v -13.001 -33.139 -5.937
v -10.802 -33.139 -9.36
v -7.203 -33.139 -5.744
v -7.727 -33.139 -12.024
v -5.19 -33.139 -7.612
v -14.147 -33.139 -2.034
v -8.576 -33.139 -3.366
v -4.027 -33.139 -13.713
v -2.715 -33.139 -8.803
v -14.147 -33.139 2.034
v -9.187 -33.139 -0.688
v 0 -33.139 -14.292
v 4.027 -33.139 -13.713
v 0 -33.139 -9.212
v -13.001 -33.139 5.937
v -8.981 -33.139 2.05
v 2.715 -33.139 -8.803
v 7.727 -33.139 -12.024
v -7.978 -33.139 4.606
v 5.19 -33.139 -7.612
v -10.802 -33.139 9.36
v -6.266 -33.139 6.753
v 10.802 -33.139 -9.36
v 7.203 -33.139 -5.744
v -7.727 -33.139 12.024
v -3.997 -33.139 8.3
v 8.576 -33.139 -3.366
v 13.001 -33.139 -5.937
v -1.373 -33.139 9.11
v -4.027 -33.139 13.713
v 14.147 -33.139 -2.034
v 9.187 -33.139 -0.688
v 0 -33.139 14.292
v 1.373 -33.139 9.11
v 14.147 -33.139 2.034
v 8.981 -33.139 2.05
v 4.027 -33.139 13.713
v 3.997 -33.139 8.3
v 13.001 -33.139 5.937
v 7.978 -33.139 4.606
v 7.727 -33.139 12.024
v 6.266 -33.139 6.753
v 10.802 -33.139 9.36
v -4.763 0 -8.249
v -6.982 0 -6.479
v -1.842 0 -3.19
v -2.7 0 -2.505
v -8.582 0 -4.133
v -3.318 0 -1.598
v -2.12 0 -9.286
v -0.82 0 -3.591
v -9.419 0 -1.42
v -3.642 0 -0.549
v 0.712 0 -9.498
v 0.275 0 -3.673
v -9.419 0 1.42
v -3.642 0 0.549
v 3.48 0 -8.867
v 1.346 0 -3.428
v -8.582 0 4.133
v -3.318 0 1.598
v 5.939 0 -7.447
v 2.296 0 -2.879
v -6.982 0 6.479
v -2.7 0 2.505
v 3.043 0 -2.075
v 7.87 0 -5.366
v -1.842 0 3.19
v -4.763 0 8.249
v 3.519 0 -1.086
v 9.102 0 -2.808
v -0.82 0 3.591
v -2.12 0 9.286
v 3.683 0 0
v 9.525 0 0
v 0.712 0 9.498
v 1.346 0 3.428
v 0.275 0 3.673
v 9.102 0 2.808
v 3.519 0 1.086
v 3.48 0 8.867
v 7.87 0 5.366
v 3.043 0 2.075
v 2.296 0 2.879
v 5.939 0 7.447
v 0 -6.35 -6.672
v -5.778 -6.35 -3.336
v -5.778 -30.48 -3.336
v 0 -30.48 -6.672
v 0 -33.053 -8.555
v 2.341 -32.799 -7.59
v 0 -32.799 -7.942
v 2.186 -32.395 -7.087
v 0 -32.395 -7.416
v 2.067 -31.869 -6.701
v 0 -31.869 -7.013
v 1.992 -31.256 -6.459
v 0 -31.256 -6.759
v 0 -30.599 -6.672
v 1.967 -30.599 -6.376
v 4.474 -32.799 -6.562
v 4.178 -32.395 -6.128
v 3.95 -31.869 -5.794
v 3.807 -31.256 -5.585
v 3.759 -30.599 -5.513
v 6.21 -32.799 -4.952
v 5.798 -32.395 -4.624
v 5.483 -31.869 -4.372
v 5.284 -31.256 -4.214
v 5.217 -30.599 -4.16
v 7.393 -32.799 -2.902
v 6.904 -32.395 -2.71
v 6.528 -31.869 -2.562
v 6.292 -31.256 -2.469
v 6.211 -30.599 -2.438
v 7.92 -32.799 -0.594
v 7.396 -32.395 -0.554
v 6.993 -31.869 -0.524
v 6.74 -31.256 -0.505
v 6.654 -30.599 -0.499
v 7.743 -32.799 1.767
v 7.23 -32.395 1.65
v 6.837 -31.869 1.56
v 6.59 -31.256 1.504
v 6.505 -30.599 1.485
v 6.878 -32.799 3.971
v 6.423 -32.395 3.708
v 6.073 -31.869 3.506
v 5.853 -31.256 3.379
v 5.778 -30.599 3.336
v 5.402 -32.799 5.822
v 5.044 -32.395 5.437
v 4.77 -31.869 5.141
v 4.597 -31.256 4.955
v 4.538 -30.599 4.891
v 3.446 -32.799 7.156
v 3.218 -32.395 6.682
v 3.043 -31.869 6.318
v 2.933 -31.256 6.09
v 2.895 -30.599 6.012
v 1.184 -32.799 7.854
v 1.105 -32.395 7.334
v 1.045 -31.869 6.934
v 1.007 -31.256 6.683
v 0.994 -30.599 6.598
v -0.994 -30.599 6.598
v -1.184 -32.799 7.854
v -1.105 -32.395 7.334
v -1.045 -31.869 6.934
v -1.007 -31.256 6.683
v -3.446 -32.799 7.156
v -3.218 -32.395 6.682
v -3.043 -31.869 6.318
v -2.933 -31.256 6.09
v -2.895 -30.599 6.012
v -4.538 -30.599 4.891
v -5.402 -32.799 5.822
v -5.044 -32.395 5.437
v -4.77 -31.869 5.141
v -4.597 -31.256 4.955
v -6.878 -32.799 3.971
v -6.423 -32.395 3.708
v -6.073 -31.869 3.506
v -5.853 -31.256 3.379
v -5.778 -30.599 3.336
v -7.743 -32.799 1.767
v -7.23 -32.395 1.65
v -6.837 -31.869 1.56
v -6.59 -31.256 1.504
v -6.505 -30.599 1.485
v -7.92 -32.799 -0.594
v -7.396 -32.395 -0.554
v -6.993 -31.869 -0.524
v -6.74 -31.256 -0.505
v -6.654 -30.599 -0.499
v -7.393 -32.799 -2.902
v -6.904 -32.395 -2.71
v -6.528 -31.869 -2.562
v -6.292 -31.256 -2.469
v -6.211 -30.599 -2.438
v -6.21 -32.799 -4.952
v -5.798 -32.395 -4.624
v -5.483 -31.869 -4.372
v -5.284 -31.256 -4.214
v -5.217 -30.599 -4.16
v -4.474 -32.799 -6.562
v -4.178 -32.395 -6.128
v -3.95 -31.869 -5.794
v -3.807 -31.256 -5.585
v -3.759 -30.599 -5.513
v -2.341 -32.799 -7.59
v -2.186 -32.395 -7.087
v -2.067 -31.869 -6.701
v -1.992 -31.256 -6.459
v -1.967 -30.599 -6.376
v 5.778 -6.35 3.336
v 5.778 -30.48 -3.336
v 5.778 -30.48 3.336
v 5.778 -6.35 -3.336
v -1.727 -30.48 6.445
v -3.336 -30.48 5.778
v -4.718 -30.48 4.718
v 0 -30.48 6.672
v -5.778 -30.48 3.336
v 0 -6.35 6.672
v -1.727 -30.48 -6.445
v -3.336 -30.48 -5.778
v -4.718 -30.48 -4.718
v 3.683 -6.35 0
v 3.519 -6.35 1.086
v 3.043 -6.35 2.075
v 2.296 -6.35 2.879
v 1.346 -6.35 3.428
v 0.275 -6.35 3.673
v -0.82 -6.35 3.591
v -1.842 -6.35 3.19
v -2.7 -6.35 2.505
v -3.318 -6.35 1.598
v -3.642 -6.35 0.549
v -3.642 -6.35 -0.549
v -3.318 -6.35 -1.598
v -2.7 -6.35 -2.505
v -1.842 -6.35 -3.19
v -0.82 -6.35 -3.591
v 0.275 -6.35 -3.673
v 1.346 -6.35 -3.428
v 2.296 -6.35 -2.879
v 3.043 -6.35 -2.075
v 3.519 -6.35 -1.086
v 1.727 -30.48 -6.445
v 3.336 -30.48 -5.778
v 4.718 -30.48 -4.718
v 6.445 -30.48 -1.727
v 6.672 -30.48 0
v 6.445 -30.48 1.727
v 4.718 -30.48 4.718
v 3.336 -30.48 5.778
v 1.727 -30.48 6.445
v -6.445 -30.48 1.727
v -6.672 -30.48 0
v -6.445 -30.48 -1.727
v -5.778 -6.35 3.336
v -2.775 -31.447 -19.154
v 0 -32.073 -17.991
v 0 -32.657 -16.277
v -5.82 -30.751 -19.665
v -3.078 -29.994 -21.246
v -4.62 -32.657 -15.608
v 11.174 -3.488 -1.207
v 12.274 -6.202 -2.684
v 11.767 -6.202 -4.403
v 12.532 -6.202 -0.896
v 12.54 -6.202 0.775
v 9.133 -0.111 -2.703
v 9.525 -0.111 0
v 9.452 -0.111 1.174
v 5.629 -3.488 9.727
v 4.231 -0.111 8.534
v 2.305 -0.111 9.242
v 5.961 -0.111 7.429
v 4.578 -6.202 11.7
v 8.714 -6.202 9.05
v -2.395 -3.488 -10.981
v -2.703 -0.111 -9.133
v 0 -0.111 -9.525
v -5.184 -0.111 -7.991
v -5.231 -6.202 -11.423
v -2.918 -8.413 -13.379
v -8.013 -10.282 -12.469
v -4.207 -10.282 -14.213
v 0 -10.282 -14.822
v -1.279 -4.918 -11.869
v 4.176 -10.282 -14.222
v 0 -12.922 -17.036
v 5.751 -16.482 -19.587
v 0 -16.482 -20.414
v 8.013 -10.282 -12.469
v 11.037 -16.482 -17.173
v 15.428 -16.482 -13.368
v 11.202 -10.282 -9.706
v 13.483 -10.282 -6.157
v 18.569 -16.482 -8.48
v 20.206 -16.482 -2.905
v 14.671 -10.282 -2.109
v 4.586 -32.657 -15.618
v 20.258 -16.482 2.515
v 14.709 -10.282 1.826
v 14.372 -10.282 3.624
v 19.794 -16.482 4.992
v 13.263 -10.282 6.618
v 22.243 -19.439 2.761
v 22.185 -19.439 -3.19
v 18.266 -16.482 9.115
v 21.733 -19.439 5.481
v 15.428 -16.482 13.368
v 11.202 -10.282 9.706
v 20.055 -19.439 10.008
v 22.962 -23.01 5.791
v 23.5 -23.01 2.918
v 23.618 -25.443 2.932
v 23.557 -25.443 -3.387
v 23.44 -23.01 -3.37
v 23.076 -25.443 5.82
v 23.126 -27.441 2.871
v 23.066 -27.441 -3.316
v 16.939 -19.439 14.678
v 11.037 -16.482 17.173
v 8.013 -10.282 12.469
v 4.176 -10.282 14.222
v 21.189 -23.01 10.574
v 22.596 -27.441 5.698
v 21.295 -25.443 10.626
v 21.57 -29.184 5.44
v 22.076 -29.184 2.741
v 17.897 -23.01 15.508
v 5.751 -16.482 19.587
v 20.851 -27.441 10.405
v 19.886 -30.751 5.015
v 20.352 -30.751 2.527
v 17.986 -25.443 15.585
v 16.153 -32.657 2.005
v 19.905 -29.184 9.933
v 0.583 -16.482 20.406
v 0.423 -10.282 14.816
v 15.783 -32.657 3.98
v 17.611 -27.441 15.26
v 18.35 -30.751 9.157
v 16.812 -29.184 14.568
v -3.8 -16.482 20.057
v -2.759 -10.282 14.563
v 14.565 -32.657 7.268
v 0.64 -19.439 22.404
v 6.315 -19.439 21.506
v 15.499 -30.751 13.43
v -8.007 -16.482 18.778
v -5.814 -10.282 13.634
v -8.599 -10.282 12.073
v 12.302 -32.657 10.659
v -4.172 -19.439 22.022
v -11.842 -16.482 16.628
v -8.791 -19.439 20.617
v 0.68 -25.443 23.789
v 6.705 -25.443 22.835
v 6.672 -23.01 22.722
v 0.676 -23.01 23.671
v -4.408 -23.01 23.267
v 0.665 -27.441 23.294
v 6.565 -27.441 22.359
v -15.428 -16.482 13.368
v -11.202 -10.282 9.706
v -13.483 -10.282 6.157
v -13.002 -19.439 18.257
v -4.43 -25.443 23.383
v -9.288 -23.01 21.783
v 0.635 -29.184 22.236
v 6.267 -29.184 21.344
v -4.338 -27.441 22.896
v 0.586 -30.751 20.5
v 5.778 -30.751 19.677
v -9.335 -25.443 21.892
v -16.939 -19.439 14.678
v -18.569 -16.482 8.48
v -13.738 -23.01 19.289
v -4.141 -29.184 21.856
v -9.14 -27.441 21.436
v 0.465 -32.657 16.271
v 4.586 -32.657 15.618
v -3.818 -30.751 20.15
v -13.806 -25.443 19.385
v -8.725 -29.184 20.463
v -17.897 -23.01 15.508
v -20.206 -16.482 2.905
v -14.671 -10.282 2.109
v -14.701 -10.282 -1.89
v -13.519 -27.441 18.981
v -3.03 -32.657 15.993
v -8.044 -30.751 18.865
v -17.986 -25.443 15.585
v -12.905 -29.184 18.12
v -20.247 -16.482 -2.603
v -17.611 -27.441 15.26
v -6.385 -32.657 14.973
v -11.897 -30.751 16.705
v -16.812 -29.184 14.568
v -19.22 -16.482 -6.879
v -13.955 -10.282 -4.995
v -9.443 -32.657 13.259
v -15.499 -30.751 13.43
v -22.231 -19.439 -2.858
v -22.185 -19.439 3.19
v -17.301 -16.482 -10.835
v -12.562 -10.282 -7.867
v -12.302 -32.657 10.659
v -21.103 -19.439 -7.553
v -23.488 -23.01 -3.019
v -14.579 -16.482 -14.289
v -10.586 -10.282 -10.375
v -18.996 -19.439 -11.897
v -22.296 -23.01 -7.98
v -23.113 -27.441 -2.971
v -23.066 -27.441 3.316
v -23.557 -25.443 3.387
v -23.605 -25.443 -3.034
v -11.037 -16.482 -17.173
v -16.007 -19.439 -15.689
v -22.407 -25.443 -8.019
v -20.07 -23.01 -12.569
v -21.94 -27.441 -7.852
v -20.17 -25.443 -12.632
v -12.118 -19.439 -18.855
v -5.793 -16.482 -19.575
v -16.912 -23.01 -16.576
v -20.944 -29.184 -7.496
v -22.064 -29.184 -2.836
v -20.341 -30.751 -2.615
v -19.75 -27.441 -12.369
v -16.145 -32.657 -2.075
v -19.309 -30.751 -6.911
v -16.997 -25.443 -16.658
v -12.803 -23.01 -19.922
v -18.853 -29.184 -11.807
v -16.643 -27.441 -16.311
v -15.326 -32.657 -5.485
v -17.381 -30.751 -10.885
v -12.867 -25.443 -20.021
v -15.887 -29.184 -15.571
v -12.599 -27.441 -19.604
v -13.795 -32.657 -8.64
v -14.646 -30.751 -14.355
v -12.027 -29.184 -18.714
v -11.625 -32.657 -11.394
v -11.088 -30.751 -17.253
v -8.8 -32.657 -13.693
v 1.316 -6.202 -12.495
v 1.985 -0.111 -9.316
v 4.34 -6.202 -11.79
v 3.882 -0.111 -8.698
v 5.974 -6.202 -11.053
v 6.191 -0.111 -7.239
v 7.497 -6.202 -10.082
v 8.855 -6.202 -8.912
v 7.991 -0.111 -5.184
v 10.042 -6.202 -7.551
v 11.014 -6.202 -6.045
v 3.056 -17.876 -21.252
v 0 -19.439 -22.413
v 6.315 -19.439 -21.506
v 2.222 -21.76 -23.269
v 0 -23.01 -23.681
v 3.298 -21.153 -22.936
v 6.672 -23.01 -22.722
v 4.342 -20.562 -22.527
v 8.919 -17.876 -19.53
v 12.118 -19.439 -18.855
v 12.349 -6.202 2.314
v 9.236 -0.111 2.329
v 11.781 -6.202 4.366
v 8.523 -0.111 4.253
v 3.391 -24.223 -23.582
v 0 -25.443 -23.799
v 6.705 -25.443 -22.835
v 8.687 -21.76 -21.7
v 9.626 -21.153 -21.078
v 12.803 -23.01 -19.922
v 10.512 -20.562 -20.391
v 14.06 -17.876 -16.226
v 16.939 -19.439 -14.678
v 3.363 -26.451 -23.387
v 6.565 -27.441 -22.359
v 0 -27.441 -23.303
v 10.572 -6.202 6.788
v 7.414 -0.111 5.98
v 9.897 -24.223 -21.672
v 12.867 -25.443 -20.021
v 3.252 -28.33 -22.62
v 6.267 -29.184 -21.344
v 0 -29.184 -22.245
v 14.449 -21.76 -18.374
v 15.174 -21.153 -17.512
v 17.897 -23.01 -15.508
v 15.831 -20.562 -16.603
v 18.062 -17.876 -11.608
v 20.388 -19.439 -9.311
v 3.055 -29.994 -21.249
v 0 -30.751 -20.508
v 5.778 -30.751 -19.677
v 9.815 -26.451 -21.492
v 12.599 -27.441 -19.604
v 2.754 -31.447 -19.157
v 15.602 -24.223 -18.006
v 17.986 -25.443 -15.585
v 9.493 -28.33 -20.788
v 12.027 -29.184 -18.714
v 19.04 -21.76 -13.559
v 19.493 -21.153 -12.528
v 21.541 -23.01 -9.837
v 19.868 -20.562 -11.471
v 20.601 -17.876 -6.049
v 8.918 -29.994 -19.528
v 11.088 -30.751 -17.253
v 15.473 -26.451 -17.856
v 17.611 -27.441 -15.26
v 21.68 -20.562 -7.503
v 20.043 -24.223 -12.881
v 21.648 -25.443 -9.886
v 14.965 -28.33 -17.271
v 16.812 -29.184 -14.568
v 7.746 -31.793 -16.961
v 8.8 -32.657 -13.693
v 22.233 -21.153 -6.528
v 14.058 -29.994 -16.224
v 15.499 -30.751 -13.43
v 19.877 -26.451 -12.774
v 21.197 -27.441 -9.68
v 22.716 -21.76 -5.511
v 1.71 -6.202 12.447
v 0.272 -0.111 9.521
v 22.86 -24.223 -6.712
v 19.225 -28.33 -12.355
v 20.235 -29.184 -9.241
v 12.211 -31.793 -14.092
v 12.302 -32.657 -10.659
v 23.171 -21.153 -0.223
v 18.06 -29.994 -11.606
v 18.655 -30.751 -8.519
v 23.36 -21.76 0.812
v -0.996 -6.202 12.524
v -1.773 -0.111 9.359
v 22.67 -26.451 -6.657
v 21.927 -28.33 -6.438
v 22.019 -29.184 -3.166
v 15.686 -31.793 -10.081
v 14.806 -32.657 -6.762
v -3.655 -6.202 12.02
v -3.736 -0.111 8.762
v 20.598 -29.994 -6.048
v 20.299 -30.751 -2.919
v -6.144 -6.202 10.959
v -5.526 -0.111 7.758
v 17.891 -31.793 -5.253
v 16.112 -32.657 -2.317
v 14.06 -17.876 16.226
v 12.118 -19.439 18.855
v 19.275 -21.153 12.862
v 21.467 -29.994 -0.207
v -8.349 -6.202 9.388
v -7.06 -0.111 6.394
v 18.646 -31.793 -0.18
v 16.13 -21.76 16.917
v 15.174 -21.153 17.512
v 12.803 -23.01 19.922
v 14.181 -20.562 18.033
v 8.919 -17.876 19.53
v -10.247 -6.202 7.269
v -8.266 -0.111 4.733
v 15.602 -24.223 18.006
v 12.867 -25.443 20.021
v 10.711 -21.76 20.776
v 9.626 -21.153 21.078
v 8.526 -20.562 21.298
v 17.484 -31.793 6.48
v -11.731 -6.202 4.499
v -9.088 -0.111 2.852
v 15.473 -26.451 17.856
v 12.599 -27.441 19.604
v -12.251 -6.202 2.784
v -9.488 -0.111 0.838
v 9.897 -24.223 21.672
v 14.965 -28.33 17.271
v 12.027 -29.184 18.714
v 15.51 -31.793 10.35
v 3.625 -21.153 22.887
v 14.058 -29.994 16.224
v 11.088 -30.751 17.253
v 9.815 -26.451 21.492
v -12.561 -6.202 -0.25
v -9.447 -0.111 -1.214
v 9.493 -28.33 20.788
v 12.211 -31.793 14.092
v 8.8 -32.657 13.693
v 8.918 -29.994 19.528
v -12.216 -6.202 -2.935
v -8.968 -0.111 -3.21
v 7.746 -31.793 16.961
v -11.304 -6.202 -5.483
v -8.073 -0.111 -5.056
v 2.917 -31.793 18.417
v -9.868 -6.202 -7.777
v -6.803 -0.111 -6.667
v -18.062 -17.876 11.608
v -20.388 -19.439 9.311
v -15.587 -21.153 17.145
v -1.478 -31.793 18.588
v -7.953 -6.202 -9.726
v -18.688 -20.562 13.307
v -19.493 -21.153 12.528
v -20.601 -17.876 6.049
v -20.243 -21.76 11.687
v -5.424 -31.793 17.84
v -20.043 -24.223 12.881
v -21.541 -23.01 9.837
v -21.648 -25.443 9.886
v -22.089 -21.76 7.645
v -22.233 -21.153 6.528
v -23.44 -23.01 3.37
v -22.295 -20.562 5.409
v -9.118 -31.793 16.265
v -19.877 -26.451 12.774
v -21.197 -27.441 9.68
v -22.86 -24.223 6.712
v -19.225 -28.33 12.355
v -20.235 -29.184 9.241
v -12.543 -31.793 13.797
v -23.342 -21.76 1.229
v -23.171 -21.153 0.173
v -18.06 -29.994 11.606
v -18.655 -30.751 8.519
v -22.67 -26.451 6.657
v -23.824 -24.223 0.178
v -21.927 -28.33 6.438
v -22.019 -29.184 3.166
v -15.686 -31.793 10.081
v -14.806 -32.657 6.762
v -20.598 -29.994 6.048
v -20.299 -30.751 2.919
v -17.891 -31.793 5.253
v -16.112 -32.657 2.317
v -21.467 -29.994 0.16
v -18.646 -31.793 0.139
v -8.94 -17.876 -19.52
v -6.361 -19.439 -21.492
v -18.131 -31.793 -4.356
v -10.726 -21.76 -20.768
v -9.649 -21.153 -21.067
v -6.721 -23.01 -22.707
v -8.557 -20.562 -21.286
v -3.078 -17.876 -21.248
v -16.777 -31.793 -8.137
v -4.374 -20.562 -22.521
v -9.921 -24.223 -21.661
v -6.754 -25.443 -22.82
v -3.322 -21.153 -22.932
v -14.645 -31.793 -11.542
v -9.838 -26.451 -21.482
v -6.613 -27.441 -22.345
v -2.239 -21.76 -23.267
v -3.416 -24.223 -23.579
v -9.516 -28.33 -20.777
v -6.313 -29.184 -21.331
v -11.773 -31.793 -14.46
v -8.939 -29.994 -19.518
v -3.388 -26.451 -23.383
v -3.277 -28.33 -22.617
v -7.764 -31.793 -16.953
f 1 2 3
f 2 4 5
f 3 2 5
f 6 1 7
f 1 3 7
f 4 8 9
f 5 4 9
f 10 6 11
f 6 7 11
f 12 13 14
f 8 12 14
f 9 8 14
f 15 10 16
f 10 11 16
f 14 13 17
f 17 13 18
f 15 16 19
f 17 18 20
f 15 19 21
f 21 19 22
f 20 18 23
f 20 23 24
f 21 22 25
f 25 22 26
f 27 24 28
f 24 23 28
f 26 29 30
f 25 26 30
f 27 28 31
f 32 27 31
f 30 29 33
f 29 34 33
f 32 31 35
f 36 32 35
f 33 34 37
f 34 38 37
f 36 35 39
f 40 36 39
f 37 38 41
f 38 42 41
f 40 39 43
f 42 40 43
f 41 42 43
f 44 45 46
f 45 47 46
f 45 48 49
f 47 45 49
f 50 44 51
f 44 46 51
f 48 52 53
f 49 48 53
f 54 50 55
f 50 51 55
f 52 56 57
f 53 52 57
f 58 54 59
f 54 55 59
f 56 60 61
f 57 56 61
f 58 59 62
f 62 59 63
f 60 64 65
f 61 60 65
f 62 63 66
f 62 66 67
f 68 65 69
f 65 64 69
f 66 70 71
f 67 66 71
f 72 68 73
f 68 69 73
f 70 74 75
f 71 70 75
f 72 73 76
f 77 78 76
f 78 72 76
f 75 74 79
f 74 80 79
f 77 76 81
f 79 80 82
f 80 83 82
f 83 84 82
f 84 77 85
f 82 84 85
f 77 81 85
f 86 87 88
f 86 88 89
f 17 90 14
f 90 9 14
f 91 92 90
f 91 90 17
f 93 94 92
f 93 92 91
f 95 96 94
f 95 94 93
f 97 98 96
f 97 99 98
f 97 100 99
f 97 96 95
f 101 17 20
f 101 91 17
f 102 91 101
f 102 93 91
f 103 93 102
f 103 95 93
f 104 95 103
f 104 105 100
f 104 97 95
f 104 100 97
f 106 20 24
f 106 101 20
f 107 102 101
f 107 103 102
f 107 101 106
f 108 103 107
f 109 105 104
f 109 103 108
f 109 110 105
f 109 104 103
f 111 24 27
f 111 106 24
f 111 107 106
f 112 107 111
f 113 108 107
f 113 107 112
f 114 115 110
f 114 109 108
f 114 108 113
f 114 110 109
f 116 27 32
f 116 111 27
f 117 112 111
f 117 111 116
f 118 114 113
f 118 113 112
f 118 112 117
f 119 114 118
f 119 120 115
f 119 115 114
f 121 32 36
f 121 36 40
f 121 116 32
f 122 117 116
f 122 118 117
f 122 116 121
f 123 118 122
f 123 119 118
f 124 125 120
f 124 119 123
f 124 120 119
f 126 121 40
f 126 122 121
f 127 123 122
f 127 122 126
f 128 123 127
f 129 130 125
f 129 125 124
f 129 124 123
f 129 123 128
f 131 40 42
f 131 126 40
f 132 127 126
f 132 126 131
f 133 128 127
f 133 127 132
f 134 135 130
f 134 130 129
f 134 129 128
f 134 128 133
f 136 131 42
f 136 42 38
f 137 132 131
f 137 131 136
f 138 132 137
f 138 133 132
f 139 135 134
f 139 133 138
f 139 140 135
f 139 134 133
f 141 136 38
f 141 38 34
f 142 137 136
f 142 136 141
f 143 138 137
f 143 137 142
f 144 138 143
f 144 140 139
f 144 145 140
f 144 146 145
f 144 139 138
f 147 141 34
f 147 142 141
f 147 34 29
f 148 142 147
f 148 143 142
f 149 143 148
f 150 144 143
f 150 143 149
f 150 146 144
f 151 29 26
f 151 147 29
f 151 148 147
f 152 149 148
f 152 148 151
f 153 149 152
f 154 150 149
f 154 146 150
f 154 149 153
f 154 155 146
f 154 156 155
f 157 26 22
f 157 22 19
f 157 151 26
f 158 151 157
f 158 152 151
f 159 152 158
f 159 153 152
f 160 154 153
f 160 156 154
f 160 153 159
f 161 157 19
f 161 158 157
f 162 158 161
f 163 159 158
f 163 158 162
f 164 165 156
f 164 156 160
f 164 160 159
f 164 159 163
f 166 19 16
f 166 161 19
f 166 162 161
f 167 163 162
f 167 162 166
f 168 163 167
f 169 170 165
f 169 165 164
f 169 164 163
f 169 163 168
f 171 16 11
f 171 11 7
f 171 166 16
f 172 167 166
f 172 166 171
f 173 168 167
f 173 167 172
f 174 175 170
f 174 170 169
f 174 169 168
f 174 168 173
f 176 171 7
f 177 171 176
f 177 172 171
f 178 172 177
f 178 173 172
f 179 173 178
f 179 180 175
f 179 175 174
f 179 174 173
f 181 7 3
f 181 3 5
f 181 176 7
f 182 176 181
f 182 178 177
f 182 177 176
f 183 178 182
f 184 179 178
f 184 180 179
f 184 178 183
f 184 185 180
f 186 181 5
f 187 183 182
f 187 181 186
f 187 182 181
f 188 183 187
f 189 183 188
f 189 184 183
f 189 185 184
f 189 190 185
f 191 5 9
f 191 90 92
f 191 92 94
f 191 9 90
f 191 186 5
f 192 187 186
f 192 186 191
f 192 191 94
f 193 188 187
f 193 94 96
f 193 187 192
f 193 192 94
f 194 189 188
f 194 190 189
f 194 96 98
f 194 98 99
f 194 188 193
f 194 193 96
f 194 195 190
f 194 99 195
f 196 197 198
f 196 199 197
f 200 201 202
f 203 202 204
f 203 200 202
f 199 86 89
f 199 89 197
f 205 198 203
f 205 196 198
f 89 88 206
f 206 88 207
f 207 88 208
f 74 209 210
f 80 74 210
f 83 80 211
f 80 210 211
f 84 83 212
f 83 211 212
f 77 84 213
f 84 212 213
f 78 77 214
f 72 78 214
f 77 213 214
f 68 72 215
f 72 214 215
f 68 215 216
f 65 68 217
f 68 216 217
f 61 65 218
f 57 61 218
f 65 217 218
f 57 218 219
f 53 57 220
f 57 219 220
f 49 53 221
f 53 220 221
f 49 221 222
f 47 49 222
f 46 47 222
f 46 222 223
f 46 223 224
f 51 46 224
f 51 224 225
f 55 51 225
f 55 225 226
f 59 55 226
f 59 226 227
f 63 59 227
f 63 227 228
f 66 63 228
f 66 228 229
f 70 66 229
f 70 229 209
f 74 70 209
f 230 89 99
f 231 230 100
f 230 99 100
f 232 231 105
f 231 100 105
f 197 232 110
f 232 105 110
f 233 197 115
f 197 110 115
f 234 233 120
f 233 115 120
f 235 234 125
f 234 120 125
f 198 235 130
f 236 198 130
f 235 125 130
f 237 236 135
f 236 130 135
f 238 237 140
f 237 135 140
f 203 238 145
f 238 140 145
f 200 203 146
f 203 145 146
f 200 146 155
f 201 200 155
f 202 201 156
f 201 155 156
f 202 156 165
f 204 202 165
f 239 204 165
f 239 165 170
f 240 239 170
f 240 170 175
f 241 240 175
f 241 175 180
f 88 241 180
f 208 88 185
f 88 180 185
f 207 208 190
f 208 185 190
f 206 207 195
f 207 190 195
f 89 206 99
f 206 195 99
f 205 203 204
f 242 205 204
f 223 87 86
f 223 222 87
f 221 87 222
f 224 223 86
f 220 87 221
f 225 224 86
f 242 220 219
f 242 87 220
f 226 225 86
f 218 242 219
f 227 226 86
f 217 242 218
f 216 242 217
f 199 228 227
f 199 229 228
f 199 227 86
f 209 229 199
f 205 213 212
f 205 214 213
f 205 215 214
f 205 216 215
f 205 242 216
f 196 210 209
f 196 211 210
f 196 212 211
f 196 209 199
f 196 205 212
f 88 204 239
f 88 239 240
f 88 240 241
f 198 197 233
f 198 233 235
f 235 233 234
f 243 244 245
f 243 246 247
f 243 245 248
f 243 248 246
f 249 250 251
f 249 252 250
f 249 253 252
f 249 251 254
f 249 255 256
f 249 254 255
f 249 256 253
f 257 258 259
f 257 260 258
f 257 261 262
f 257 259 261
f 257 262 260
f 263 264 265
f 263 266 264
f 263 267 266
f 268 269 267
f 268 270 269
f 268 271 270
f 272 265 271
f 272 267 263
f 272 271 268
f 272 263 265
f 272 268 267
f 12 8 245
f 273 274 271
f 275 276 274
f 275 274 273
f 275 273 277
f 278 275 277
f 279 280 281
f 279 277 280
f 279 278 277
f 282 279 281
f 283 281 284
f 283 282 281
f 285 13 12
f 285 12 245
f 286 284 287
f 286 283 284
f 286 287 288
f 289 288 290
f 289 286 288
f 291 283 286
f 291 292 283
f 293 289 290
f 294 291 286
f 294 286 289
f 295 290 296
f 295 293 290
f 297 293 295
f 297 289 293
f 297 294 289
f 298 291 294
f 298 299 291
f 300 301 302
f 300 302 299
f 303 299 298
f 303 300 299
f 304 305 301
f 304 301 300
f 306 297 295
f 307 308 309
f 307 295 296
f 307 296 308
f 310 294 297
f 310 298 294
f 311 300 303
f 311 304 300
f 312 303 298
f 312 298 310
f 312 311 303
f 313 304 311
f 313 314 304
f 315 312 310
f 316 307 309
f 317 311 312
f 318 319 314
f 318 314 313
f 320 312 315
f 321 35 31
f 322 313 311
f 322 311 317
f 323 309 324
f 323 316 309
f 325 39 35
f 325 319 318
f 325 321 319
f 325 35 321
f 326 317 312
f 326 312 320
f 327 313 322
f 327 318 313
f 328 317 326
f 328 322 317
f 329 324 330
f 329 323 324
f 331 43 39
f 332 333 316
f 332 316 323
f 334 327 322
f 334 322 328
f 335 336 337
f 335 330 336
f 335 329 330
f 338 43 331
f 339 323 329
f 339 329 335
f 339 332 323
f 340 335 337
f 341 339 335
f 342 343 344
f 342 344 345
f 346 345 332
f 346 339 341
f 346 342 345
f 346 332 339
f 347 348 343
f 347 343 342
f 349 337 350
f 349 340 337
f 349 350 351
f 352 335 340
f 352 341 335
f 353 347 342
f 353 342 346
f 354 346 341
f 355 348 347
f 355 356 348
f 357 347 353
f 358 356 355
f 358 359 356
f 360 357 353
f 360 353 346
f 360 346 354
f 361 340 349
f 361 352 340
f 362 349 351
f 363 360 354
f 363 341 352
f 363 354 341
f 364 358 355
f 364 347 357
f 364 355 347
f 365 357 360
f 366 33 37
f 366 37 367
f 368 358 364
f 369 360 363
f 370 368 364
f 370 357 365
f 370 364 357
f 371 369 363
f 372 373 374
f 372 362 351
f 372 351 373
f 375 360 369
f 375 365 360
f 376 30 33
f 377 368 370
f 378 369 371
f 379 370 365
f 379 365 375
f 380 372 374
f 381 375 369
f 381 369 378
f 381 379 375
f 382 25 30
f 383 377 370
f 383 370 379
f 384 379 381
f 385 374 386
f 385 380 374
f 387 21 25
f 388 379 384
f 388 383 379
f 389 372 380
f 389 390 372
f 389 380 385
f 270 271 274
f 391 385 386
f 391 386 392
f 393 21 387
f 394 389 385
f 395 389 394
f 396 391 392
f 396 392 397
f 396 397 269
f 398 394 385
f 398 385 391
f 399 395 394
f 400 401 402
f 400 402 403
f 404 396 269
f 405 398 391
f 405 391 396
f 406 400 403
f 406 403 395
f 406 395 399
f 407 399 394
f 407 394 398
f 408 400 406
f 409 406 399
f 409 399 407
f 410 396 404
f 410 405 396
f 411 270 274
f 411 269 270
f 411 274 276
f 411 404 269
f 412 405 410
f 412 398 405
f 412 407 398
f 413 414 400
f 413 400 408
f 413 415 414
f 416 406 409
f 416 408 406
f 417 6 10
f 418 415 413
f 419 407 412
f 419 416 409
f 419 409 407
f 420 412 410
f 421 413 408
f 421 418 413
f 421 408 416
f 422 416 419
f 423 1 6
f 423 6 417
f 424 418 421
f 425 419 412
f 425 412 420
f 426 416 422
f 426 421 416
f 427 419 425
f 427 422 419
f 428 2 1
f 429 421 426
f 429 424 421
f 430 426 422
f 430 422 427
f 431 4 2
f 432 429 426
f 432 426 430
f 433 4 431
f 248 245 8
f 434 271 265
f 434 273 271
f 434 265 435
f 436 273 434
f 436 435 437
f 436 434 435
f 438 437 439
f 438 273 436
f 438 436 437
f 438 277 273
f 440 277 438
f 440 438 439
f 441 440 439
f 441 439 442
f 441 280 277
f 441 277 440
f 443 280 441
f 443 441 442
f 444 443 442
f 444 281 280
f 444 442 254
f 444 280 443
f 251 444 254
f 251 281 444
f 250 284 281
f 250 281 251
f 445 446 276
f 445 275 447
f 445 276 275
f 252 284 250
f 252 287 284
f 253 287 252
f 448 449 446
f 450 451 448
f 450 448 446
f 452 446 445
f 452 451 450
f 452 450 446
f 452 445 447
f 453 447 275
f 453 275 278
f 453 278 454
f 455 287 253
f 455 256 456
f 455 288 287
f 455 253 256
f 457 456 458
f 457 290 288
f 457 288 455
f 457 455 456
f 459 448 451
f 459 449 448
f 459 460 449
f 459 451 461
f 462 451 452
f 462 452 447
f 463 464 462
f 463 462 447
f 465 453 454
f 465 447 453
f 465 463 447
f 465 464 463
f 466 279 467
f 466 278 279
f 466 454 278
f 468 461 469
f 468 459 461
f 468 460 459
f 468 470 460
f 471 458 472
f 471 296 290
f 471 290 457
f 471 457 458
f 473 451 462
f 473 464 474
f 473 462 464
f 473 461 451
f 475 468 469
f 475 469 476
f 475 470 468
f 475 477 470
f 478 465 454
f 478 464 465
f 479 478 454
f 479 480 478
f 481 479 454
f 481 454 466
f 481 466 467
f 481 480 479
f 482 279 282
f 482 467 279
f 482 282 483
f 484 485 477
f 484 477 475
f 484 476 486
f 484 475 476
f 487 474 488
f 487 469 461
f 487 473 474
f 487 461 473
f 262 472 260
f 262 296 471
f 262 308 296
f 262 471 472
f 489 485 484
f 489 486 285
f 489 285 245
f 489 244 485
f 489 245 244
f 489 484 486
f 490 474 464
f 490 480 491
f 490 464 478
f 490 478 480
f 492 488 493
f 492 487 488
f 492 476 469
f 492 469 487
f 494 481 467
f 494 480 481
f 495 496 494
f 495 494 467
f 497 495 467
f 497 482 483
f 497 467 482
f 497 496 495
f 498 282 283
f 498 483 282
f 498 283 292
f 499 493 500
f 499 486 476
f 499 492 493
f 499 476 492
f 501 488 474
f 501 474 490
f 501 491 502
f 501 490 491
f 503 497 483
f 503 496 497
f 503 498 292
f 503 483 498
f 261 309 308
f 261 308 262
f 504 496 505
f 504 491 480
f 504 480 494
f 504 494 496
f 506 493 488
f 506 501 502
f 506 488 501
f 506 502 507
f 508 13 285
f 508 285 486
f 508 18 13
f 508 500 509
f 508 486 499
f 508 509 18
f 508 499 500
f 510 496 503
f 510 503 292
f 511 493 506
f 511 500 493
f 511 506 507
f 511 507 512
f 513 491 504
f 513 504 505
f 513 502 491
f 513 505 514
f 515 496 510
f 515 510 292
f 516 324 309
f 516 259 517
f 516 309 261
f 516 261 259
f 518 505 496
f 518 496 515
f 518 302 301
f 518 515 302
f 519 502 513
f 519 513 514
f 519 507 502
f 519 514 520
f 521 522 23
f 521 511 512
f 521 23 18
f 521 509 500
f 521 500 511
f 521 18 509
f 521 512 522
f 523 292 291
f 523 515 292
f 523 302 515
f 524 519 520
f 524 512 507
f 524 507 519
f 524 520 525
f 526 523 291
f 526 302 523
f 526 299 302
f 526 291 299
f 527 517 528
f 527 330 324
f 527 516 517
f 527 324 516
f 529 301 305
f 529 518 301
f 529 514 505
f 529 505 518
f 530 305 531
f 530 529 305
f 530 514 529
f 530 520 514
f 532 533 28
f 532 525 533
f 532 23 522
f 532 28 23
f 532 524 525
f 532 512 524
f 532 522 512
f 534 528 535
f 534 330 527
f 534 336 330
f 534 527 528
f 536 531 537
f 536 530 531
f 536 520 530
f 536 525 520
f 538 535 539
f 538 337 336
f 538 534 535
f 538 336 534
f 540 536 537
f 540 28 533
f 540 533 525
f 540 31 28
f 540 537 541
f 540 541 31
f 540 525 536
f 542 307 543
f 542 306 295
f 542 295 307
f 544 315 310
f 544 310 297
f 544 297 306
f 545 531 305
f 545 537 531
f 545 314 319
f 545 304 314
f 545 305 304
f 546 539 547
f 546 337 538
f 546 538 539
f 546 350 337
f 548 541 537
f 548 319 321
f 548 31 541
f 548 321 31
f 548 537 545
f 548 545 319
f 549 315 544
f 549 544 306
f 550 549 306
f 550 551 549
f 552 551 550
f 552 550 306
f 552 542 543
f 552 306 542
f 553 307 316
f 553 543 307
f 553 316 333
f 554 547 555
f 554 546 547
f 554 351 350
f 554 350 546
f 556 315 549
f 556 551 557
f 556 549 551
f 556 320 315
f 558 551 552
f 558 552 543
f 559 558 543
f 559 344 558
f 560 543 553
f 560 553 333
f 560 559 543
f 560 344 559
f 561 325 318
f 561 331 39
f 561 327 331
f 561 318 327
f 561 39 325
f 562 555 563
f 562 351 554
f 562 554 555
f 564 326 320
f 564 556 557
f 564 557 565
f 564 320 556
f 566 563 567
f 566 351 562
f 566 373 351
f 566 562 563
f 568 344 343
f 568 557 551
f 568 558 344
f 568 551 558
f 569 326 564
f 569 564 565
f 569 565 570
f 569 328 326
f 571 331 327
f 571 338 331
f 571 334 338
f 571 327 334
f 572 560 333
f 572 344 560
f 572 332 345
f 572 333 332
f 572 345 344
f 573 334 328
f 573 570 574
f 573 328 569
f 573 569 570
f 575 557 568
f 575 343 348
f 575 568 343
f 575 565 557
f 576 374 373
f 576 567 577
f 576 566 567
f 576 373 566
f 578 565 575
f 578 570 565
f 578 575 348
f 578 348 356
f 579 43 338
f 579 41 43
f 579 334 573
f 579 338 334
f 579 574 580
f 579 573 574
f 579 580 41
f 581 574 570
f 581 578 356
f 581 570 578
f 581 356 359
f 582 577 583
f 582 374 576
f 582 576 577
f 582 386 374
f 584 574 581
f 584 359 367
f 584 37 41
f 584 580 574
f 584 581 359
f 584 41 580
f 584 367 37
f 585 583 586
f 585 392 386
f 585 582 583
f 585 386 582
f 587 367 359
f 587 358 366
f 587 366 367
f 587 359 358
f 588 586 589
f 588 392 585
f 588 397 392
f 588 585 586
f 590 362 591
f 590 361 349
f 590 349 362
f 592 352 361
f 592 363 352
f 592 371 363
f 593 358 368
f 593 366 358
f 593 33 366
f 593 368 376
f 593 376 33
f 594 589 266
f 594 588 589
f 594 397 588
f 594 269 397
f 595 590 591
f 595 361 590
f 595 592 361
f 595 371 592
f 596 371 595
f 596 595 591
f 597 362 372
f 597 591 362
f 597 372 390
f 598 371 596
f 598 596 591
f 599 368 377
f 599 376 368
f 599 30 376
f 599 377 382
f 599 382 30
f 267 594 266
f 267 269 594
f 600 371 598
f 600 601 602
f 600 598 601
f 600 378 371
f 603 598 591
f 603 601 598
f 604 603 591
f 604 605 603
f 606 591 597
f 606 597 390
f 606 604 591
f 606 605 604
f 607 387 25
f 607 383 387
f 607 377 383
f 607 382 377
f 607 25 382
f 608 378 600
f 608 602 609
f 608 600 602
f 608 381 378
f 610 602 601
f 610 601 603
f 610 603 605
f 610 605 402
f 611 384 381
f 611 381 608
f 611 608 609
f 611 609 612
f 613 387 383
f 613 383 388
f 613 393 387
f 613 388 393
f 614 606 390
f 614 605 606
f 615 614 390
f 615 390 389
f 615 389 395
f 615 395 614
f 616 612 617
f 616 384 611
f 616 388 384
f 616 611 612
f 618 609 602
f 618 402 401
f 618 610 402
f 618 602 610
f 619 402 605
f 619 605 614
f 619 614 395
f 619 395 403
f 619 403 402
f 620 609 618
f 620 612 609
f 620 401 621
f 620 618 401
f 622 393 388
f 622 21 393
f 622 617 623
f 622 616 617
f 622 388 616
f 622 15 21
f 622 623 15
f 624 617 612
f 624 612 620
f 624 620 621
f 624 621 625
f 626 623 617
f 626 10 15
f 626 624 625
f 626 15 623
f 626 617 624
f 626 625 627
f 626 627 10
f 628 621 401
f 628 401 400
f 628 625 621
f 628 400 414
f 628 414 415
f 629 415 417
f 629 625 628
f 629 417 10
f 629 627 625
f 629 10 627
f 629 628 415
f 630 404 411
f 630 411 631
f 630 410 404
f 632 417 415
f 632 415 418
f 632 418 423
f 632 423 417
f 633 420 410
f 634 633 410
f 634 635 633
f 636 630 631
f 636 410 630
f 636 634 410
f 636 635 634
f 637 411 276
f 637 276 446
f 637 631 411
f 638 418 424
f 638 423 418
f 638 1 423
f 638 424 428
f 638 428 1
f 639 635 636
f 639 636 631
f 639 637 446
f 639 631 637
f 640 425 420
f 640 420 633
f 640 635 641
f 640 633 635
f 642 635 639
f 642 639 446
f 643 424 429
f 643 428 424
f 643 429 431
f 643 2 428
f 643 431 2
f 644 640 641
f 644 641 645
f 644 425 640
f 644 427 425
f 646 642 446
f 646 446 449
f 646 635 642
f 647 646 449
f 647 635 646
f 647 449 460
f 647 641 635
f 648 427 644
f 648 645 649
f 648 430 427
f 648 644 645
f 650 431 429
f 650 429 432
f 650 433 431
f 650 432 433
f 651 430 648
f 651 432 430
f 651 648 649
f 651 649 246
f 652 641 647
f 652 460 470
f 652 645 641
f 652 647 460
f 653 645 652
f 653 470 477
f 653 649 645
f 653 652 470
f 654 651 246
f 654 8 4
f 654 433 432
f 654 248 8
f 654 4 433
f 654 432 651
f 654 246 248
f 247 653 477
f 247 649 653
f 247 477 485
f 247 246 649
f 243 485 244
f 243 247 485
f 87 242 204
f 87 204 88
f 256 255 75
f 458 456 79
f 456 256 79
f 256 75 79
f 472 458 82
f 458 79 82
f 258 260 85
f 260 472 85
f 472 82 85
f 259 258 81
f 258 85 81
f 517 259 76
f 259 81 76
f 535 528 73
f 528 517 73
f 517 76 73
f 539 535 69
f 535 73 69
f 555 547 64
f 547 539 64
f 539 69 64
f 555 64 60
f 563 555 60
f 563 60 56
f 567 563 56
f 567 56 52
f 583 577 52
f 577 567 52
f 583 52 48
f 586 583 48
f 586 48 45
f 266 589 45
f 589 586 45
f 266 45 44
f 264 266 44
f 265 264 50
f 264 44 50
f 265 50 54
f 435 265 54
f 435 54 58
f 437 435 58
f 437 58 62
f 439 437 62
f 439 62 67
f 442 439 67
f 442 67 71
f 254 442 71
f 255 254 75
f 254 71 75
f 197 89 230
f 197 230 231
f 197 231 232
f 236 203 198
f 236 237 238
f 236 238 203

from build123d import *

# Parameters (mm, degrees)
F0_R     = 9.525
F1_DEPTH = 15.24
F3_DEPTH = 8.89
F4_R     = 3.683
F5_DEPTH = 6.351
F8_R     = 2.54
F9_DEPTH = 15.24


# Not quite as in the source:
# - a feature names something its author has since deleted; it is built from what else it names


with BuildPart() as f1:
    # F0 (on Front) → F1 (new body)
    with BuildSketch(Plane.XZ):
        Circle(F0_R)
    extrude(amount=F1_DEPTH)

    # F2 (on face) → F3 (cut)
    with BuildSketch(Plane.XZ.offset(15.24)):
        Polygon((5.7785, -3.3362185305), (5.7785, 3.3362185305), (0, 6.672437061), (-5.7785, 3.3362185305), (-5.7785, -3.3362185305), (0, -6.672437061), align=None)
    extrude(amount=-F3_DEPTH, mode=Mode.SUBTRACT)

    # F4 (on face) → F5 (cut, through all)
    with BuildSketch(Plane.XZ.offset(6.35)):
        Circle(F4_R)
    extrude(amount=-F5_DEPTH, mode=Mode.SUBTRACT)

    # F6 (on Right) → F7 (revolve)
    with BuildSketch(Plane.YZ):
        with BuildLine():
            Line((-33.139064908, -6.672437061), (-33.139064908, -14.292437061))
            add(Edge.make_bspline(
                [(0, -9.4667123631), (-6.0169453004, -12.6291806394), (-11.4998287108, -14.4075187704), (-18.7425000775, -24.446910043), (-30.9530390066, -25.1909209173), (-33.139064908, -14.292437061)],
                knots=[0, 0, 0, 0, 0.3337672016, 0.635034675, 1, 1, 1, 1], degree=3))
            Line((0, -9.4667123631), (0, -6.672437061))
            Line((0, -6.672437061), (-33.139064908, -6.672437061))
        make_face()
    revolve(axis=Axis((0, -11.1619029194, 0), (0, -1, 0)))

    # F8
    f8_edges = [f1.edges().sort_by_distance(p)[0] for p in [
        (0, -33.139065, 6.672437),
    ]]
    fillet(f8_edges, radius=F8_R)

    # F9 (add): faces of the model
    f9_faces = [f1.faces().sort_by_distance(p)[0] for p in [
        (-3.069105432, -15.24, 5.315846542),
        (-6.138210864, -15.24, 0),
        (-3.069105432, -15.24, -5.315846542),
        (6.138210864, -15.24, 0),
        (3.069105432, -15.24, -5.315846542),
        (3.069105432, -15.24, 5.315846542),
    ]]
    extrude(f9_faces, amount=F9_DEPTH)


solid = f1.part
